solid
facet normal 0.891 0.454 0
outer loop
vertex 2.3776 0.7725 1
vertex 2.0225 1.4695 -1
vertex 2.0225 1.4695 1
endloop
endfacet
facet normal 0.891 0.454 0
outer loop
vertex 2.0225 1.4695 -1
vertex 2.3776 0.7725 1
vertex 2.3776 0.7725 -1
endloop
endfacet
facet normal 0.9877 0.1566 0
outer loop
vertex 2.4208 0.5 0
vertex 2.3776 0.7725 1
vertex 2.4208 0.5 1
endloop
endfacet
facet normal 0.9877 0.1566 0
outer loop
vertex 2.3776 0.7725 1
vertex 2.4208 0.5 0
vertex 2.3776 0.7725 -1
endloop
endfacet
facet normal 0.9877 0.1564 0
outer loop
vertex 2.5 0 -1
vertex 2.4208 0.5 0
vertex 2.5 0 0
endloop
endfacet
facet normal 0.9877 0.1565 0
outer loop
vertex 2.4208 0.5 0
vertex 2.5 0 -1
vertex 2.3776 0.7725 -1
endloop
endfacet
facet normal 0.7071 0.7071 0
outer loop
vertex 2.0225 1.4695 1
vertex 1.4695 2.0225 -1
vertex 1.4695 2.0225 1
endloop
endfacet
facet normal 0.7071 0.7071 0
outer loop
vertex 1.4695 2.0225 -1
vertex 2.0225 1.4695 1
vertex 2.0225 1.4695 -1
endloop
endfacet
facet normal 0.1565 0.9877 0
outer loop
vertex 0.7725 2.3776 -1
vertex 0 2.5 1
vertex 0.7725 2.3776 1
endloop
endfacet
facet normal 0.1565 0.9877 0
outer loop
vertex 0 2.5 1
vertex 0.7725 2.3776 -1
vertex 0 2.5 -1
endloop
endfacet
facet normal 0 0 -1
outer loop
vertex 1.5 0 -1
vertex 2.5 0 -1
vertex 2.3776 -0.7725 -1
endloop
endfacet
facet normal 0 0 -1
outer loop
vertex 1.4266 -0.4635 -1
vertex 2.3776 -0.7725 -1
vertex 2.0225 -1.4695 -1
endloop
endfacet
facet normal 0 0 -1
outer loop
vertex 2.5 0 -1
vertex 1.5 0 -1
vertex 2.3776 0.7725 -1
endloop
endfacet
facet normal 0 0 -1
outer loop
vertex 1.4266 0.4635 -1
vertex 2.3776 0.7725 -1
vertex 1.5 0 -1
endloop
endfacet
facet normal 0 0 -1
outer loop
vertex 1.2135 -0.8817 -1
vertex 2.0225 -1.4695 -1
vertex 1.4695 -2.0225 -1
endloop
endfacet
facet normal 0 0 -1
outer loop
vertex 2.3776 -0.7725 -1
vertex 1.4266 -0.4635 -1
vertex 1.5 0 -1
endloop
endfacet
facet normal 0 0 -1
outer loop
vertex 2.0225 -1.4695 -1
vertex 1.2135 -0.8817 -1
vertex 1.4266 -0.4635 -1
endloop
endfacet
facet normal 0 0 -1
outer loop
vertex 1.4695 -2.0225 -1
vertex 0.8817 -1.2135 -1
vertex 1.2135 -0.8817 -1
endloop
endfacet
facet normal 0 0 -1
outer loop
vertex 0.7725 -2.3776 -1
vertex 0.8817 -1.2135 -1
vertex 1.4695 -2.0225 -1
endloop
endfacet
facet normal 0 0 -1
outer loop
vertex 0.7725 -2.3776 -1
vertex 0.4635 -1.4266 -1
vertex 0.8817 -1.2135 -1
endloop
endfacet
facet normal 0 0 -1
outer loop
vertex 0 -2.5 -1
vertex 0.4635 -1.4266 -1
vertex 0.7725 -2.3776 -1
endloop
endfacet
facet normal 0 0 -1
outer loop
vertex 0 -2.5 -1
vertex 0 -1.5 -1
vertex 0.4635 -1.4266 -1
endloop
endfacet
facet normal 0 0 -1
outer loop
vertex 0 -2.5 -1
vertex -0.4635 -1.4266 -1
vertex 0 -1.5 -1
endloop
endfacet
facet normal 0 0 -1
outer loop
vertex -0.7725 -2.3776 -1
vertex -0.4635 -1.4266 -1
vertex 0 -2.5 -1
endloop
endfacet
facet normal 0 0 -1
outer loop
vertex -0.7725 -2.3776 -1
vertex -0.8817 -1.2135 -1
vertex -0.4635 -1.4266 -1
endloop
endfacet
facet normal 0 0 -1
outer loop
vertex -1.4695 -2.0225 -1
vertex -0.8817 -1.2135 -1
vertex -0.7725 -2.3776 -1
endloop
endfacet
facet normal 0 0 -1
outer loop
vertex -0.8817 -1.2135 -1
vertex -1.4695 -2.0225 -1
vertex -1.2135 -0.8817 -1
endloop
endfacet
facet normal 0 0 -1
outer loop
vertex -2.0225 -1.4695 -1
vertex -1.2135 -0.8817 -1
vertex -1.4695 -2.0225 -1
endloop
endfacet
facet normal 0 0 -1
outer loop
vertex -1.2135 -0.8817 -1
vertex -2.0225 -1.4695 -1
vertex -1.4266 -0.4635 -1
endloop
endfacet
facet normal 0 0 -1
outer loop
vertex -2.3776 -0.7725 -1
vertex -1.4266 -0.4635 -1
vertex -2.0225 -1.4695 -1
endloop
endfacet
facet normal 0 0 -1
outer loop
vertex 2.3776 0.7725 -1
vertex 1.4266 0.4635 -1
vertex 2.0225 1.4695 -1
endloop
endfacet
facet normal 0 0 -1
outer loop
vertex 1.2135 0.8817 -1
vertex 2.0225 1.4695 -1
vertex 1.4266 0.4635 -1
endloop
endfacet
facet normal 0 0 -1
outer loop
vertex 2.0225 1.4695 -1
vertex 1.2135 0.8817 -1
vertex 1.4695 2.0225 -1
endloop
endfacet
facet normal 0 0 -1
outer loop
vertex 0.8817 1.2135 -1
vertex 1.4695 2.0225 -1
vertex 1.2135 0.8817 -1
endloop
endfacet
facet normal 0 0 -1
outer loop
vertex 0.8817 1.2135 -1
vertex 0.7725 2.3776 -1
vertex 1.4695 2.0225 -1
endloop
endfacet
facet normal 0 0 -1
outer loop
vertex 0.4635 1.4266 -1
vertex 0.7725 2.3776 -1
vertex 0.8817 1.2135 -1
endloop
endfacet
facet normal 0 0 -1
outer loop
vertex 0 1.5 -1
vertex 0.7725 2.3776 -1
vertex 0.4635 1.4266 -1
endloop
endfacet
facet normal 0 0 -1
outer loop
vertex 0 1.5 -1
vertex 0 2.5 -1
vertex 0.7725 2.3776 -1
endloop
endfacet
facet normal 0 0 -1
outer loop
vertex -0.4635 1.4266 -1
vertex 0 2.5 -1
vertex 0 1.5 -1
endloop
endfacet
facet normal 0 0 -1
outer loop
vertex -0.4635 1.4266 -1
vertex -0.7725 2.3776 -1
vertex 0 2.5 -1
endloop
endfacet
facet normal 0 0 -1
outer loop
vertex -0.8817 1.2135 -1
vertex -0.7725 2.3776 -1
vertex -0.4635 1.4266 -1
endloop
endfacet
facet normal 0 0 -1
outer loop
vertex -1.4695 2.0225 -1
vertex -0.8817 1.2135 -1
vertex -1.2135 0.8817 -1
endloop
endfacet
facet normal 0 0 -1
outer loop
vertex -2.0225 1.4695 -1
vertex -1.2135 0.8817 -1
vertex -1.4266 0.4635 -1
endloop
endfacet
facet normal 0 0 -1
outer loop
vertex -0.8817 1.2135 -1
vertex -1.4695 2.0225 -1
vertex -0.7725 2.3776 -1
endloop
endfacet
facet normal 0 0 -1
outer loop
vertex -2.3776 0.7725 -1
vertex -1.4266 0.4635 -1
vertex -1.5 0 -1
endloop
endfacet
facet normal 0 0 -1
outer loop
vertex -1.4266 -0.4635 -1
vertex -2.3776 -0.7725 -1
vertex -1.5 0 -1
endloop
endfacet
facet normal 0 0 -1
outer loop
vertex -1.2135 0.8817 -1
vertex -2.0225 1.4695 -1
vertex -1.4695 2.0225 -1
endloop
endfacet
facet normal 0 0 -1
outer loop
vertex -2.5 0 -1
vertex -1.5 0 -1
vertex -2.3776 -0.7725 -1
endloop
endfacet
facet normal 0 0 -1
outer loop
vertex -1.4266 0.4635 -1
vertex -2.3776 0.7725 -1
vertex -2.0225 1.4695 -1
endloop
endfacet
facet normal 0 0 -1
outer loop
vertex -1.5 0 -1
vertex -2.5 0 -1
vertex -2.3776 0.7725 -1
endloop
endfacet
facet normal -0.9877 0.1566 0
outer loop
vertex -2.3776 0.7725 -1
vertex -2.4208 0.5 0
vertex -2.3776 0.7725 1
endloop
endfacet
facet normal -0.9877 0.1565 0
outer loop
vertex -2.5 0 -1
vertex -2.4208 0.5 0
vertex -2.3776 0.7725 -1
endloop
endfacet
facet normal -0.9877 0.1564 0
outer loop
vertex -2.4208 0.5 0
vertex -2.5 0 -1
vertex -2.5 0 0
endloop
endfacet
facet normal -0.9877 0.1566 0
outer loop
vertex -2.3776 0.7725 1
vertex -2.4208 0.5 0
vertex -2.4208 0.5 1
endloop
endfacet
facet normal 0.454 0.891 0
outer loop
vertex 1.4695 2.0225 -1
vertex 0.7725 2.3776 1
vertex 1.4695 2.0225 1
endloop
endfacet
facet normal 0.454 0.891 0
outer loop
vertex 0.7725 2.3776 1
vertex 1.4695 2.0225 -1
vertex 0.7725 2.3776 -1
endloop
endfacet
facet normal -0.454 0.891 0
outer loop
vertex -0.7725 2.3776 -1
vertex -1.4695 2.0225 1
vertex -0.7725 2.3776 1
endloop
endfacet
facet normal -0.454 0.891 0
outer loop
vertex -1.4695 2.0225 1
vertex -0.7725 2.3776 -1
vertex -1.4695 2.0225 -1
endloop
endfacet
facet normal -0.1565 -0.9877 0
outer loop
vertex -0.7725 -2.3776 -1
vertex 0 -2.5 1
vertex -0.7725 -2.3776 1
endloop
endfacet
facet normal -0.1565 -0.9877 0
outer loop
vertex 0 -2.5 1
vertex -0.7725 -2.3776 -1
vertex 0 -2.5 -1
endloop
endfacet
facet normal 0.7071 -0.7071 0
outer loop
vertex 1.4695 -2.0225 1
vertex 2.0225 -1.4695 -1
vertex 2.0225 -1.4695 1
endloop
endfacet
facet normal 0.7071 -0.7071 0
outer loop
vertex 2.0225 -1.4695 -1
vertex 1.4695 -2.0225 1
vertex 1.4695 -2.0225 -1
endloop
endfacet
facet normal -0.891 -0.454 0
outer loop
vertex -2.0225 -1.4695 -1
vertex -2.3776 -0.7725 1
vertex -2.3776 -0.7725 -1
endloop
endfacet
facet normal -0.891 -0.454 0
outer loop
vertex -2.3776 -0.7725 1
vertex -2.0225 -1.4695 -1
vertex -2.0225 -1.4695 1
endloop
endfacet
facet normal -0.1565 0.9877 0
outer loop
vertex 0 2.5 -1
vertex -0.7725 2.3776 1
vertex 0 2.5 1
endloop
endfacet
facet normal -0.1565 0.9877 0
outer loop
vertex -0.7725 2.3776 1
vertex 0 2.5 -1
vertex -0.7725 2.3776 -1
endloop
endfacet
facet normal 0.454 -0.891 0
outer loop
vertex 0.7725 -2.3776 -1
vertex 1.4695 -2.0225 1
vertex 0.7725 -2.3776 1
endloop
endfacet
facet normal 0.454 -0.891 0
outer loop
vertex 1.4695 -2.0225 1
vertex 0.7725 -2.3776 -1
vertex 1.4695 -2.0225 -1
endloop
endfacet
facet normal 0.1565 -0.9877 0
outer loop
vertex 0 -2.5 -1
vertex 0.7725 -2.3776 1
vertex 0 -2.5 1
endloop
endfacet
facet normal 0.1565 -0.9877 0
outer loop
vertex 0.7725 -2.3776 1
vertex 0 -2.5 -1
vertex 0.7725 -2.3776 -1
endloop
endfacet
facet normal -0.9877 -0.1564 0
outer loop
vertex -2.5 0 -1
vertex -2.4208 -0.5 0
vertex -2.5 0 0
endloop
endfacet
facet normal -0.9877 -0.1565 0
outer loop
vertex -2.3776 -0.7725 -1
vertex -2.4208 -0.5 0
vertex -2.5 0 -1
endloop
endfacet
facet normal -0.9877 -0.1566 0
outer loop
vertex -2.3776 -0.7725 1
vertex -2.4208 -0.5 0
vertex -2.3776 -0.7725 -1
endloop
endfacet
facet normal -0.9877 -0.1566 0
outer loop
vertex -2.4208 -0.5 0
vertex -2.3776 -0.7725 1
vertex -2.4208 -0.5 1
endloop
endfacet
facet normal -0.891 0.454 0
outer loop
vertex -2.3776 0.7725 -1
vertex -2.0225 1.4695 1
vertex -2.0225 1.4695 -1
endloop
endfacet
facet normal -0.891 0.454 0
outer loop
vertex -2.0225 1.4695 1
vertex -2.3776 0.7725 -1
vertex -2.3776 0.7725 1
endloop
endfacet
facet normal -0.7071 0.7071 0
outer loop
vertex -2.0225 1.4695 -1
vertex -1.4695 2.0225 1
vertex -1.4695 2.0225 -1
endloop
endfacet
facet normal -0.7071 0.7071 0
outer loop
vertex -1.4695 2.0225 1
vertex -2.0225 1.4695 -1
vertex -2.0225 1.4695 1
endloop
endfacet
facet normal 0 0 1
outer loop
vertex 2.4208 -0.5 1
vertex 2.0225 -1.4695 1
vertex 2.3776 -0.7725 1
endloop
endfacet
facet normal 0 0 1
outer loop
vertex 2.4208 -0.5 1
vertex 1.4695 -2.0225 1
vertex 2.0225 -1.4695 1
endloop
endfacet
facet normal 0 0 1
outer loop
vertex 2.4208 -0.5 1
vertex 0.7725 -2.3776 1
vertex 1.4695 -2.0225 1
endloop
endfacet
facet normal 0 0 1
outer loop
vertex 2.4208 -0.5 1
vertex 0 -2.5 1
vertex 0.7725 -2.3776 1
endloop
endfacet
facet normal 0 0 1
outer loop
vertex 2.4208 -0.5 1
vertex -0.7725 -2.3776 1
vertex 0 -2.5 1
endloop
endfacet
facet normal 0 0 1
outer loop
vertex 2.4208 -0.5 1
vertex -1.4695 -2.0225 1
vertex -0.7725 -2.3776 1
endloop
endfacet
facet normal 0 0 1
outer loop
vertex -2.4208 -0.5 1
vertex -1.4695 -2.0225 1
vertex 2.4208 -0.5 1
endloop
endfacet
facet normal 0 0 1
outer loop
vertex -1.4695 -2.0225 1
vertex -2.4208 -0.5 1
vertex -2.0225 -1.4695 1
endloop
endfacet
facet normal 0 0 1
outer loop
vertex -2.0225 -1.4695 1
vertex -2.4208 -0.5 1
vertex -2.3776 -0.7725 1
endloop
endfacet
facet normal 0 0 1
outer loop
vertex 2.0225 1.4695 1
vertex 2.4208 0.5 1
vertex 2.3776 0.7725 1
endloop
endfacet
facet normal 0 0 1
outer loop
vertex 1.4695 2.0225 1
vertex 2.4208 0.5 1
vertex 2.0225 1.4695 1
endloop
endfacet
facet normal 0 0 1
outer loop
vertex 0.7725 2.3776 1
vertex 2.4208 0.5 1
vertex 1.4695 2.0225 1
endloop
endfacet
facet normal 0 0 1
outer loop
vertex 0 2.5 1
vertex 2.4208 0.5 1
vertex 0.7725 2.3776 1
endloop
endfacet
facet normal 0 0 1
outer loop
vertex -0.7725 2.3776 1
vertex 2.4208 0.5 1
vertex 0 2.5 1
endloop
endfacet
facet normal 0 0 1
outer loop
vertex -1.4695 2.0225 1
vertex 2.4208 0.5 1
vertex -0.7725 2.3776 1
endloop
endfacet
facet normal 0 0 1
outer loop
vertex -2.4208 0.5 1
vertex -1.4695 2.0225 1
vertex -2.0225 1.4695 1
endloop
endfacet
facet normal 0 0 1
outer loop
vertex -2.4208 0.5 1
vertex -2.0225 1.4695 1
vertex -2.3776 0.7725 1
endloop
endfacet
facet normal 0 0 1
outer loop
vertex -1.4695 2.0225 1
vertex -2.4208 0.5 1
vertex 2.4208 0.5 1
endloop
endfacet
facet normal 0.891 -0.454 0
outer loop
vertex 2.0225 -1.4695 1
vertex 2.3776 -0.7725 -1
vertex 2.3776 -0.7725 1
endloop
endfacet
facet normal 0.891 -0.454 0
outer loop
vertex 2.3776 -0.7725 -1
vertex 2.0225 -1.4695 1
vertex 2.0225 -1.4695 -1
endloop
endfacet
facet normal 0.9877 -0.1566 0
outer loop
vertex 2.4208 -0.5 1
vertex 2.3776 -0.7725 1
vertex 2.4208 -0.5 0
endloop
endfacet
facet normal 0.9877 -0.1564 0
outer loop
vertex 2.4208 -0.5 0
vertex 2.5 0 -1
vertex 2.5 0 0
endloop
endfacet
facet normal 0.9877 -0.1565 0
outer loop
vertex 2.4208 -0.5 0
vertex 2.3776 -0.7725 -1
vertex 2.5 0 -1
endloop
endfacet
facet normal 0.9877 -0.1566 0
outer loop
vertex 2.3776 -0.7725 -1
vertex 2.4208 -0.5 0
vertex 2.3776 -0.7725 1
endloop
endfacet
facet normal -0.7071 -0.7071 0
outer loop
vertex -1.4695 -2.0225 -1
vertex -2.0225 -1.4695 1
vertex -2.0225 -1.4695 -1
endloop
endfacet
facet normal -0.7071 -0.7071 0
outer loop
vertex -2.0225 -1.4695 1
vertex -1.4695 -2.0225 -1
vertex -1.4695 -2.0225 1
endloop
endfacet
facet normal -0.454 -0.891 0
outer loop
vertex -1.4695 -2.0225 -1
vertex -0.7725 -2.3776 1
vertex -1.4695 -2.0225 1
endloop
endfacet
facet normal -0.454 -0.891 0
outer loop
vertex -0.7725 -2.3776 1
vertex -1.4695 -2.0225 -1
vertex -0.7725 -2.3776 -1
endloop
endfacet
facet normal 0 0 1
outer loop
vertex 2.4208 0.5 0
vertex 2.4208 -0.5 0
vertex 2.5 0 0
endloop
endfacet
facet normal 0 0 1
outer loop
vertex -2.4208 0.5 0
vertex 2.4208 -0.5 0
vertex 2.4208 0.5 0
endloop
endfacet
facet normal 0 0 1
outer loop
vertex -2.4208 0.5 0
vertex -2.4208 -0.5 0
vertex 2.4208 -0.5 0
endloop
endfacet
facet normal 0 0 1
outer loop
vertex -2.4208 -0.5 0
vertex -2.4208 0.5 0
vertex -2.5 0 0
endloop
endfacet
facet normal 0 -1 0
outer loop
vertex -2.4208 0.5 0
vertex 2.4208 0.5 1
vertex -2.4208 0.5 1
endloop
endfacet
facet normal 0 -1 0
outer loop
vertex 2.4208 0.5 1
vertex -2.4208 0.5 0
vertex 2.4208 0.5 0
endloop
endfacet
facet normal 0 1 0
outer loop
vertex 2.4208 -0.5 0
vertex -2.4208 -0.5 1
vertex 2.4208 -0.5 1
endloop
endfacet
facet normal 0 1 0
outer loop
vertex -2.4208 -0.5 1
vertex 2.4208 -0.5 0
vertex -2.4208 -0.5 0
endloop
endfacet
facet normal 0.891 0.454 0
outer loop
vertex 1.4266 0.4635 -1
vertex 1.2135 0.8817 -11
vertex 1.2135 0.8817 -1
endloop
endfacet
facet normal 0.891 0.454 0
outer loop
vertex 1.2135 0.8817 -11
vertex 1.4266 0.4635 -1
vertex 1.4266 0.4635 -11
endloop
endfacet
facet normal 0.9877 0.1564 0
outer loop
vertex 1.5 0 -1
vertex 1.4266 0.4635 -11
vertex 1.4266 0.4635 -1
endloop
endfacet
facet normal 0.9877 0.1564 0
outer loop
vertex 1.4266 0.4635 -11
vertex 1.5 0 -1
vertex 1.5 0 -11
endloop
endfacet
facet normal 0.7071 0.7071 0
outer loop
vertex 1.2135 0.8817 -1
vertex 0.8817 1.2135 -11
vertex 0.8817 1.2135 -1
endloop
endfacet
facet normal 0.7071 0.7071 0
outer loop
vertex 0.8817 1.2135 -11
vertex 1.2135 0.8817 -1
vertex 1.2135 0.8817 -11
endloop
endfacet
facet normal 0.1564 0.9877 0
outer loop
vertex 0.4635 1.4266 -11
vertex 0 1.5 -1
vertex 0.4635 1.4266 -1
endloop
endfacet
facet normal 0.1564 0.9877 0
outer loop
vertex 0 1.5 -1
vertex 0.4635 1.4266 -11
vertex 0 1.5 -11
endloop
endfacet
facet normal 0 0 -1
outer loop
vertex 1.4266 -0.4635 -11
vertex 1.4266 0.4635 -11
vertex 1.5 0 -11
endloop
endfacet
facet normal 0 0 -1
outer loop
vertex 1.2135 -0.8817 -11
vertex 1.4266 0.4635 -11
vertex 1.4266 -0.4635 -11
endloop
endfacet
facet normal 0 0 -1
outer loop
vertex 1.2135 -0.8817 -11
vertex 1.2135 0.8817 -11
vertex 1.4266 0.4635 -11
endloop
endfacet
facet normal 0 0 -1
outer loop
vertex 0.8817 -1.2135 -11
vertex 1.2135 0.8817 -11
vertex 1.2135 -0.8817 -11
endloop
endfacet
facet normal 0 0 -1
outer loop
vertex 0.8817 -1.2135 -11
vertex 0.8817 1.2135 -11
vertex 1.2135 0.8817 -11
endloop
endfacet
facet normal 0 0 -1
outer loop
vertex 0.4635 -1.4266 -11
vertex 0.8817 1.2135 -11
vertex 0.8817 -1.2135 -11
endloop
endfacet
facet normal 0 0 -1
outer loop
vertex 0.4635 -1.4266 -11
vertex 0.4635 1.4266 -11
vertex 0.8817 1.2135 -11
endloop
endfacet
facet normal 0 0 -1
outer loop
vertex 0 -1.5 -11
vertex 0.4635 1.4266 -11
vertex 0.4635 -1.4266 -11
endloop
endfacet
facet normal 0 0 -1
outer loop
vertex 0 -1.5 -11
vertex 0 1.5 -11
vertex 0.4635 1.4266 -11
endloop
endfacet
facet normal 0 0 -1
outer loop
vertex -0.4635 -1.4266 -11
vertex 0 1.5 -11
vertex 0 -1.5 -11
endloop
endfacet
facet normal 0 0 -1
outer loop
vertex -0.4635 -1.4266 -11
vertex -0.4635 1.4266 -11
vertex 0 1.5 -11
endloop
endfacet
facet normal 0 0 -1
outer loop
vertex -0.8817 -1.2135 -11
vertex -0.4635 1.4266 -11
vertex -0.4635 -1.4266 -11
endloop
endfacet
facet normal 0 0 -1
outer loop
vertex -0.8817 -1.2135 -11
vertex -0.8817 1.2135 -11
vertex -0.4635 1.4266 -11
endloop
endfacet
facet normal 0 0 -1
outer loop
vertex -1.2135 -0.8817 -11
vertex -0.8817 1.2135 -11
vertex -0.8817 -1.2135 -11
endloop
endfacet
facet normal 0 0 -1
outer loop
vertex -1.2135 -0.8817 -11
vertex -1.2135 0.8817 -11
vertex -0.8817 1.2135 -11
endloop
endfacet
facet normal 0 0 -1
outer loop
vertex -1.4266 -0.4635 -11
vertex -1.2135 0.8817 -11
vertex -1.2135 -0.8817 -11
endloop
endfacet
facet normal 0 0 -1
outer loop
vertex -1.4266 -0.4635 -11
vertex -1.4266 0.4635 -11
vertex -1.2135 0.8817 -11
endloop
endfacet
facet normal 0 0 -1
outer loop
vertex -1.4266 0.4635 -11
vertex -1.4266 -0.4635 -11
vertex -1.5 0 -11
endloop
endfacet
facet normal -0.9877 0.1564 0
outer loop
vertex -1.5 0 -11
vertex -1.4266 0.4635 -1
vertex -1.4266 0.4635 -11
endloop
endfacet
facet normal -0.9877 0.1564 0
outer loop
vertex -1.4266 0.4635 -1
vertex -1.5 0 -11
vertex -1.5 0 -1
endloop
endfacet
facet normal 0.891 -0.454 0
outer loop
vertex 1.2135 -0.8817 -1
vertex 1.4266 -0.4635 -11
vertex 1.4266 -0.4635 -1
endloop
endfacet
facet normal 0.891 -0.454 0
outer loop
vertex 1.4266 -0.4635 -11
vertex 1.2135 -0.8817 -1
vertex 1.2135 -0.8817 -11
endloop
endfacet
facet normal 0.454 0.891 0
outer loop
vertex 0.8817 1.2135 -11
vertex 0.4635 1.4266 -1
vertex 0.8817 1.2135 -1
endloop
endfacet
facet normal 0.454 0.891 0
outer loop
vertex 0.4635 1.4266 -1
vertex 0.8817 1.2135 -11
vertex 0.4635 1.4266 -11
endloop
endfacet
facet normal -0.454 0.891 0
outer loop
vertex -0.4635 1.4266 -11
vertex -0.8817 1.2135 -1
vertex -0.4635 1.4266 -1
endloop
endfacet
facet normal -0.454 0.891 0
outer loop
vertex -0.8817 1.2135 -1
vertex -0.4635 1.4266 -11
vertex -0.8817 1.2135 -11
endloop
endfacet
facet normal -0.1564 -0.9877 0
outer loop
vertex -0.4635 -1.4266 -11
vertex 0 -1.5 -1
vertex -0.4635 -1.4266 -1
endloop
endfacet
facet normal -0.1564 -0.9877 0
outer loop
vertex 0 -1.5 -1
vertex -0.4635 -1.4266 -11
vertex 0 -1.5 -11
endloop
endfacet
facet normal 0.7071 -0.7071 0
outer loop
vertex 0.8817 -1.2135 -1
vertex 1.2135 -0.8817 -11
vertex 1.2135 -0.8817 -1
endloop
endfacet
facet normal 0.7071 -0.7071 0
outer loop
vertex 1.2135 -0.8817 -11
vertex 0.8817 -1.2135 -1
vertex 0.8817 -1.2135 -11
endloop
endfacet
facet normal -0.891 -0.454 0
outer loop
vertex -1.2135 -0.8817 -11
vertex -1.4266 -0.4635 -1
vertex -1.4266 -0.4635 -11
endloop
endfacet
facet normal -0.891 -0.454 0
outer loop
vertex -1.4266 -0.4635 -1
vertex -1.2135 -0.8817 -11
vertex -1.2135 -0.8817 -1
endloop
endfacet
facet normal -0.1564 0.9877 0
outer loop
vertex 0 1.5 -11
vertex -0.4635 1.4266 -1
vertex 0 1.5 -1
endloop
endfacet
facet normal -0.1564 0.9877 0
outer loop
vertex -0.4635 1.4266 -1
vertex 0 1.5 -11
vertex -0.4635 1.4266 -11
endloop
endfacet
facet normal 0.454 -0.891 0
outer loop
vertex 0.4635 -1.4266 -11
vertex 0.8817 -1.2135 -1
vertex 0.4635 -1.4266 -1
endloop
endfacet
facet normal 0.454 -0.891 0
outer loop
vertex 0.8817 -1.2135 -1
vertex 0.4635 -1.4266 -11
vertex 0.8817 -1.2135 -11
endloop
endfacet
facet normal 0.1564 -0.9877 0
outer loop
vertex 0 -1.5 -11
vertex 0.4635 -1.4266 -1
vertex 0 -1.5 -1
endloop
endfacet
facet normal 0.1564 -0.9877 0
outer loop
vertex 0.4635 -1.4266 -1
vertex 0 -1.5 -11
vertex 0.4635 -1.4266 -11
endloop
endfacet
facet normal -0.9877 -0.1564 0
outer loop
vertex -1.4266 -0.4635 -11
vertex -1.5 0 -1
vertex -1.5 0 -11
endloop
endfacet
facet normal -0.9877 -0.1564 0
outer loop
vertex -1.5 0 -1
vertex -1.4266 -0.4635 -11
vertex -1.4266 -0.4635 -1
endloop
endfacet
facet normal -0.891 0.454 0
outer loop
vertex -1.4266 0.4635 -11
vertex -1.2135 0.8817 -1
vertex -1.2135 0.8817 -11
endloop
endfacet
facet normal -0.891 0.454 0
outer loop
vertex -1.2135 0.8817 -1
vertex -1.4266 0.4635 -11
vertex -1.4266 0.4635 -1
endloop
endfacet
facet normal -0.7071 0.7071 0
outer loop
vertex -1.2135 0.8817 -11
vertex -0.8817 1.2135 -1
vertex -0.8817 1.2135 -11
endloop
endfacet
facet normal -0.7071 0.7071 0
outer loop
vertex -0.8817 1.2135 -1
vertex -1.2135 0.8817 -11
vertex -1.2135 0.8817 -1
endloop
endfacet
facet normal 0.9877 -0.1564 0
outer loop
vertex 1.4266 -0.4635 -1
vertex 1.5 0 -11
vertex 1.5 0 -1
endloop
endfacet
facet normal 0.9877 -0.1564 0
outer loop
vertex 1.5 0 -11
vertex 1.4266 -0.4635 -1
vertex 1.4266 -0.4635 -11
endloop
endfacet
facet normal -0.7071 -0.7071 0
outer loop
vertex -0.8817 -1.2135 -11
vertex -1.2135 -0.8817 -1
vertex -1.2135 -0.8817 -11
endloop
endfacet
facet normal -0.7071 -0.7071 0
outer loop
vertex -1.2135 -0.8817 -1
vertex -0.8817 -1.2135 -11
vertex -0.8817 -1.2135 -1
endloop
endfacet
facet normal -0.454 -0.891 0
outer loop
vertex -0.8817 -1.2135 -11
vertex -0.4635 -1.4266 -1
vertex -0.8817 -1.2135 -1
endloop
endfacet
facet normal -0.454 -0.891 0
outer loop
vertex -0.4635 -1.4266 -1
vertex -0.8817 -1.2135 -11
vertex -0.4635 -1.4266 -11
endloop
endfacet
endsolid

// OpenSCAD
//-- M3 x 10
drill=3;
length=10;
head_thickness=2;
head_diameter=5;


union() {
  translate([0,0,-length/2-head_thickness/2])
  cylinder(h=length, r=drill/2,center=true, $fn=20);

  difference() {
    cylinder(h=head_thickness, r=head_diameter/2, $fn=20, center=true);

     translate([0,0,5])
        cube([head_diameter+2, 1,10],center=true);
  }
}
